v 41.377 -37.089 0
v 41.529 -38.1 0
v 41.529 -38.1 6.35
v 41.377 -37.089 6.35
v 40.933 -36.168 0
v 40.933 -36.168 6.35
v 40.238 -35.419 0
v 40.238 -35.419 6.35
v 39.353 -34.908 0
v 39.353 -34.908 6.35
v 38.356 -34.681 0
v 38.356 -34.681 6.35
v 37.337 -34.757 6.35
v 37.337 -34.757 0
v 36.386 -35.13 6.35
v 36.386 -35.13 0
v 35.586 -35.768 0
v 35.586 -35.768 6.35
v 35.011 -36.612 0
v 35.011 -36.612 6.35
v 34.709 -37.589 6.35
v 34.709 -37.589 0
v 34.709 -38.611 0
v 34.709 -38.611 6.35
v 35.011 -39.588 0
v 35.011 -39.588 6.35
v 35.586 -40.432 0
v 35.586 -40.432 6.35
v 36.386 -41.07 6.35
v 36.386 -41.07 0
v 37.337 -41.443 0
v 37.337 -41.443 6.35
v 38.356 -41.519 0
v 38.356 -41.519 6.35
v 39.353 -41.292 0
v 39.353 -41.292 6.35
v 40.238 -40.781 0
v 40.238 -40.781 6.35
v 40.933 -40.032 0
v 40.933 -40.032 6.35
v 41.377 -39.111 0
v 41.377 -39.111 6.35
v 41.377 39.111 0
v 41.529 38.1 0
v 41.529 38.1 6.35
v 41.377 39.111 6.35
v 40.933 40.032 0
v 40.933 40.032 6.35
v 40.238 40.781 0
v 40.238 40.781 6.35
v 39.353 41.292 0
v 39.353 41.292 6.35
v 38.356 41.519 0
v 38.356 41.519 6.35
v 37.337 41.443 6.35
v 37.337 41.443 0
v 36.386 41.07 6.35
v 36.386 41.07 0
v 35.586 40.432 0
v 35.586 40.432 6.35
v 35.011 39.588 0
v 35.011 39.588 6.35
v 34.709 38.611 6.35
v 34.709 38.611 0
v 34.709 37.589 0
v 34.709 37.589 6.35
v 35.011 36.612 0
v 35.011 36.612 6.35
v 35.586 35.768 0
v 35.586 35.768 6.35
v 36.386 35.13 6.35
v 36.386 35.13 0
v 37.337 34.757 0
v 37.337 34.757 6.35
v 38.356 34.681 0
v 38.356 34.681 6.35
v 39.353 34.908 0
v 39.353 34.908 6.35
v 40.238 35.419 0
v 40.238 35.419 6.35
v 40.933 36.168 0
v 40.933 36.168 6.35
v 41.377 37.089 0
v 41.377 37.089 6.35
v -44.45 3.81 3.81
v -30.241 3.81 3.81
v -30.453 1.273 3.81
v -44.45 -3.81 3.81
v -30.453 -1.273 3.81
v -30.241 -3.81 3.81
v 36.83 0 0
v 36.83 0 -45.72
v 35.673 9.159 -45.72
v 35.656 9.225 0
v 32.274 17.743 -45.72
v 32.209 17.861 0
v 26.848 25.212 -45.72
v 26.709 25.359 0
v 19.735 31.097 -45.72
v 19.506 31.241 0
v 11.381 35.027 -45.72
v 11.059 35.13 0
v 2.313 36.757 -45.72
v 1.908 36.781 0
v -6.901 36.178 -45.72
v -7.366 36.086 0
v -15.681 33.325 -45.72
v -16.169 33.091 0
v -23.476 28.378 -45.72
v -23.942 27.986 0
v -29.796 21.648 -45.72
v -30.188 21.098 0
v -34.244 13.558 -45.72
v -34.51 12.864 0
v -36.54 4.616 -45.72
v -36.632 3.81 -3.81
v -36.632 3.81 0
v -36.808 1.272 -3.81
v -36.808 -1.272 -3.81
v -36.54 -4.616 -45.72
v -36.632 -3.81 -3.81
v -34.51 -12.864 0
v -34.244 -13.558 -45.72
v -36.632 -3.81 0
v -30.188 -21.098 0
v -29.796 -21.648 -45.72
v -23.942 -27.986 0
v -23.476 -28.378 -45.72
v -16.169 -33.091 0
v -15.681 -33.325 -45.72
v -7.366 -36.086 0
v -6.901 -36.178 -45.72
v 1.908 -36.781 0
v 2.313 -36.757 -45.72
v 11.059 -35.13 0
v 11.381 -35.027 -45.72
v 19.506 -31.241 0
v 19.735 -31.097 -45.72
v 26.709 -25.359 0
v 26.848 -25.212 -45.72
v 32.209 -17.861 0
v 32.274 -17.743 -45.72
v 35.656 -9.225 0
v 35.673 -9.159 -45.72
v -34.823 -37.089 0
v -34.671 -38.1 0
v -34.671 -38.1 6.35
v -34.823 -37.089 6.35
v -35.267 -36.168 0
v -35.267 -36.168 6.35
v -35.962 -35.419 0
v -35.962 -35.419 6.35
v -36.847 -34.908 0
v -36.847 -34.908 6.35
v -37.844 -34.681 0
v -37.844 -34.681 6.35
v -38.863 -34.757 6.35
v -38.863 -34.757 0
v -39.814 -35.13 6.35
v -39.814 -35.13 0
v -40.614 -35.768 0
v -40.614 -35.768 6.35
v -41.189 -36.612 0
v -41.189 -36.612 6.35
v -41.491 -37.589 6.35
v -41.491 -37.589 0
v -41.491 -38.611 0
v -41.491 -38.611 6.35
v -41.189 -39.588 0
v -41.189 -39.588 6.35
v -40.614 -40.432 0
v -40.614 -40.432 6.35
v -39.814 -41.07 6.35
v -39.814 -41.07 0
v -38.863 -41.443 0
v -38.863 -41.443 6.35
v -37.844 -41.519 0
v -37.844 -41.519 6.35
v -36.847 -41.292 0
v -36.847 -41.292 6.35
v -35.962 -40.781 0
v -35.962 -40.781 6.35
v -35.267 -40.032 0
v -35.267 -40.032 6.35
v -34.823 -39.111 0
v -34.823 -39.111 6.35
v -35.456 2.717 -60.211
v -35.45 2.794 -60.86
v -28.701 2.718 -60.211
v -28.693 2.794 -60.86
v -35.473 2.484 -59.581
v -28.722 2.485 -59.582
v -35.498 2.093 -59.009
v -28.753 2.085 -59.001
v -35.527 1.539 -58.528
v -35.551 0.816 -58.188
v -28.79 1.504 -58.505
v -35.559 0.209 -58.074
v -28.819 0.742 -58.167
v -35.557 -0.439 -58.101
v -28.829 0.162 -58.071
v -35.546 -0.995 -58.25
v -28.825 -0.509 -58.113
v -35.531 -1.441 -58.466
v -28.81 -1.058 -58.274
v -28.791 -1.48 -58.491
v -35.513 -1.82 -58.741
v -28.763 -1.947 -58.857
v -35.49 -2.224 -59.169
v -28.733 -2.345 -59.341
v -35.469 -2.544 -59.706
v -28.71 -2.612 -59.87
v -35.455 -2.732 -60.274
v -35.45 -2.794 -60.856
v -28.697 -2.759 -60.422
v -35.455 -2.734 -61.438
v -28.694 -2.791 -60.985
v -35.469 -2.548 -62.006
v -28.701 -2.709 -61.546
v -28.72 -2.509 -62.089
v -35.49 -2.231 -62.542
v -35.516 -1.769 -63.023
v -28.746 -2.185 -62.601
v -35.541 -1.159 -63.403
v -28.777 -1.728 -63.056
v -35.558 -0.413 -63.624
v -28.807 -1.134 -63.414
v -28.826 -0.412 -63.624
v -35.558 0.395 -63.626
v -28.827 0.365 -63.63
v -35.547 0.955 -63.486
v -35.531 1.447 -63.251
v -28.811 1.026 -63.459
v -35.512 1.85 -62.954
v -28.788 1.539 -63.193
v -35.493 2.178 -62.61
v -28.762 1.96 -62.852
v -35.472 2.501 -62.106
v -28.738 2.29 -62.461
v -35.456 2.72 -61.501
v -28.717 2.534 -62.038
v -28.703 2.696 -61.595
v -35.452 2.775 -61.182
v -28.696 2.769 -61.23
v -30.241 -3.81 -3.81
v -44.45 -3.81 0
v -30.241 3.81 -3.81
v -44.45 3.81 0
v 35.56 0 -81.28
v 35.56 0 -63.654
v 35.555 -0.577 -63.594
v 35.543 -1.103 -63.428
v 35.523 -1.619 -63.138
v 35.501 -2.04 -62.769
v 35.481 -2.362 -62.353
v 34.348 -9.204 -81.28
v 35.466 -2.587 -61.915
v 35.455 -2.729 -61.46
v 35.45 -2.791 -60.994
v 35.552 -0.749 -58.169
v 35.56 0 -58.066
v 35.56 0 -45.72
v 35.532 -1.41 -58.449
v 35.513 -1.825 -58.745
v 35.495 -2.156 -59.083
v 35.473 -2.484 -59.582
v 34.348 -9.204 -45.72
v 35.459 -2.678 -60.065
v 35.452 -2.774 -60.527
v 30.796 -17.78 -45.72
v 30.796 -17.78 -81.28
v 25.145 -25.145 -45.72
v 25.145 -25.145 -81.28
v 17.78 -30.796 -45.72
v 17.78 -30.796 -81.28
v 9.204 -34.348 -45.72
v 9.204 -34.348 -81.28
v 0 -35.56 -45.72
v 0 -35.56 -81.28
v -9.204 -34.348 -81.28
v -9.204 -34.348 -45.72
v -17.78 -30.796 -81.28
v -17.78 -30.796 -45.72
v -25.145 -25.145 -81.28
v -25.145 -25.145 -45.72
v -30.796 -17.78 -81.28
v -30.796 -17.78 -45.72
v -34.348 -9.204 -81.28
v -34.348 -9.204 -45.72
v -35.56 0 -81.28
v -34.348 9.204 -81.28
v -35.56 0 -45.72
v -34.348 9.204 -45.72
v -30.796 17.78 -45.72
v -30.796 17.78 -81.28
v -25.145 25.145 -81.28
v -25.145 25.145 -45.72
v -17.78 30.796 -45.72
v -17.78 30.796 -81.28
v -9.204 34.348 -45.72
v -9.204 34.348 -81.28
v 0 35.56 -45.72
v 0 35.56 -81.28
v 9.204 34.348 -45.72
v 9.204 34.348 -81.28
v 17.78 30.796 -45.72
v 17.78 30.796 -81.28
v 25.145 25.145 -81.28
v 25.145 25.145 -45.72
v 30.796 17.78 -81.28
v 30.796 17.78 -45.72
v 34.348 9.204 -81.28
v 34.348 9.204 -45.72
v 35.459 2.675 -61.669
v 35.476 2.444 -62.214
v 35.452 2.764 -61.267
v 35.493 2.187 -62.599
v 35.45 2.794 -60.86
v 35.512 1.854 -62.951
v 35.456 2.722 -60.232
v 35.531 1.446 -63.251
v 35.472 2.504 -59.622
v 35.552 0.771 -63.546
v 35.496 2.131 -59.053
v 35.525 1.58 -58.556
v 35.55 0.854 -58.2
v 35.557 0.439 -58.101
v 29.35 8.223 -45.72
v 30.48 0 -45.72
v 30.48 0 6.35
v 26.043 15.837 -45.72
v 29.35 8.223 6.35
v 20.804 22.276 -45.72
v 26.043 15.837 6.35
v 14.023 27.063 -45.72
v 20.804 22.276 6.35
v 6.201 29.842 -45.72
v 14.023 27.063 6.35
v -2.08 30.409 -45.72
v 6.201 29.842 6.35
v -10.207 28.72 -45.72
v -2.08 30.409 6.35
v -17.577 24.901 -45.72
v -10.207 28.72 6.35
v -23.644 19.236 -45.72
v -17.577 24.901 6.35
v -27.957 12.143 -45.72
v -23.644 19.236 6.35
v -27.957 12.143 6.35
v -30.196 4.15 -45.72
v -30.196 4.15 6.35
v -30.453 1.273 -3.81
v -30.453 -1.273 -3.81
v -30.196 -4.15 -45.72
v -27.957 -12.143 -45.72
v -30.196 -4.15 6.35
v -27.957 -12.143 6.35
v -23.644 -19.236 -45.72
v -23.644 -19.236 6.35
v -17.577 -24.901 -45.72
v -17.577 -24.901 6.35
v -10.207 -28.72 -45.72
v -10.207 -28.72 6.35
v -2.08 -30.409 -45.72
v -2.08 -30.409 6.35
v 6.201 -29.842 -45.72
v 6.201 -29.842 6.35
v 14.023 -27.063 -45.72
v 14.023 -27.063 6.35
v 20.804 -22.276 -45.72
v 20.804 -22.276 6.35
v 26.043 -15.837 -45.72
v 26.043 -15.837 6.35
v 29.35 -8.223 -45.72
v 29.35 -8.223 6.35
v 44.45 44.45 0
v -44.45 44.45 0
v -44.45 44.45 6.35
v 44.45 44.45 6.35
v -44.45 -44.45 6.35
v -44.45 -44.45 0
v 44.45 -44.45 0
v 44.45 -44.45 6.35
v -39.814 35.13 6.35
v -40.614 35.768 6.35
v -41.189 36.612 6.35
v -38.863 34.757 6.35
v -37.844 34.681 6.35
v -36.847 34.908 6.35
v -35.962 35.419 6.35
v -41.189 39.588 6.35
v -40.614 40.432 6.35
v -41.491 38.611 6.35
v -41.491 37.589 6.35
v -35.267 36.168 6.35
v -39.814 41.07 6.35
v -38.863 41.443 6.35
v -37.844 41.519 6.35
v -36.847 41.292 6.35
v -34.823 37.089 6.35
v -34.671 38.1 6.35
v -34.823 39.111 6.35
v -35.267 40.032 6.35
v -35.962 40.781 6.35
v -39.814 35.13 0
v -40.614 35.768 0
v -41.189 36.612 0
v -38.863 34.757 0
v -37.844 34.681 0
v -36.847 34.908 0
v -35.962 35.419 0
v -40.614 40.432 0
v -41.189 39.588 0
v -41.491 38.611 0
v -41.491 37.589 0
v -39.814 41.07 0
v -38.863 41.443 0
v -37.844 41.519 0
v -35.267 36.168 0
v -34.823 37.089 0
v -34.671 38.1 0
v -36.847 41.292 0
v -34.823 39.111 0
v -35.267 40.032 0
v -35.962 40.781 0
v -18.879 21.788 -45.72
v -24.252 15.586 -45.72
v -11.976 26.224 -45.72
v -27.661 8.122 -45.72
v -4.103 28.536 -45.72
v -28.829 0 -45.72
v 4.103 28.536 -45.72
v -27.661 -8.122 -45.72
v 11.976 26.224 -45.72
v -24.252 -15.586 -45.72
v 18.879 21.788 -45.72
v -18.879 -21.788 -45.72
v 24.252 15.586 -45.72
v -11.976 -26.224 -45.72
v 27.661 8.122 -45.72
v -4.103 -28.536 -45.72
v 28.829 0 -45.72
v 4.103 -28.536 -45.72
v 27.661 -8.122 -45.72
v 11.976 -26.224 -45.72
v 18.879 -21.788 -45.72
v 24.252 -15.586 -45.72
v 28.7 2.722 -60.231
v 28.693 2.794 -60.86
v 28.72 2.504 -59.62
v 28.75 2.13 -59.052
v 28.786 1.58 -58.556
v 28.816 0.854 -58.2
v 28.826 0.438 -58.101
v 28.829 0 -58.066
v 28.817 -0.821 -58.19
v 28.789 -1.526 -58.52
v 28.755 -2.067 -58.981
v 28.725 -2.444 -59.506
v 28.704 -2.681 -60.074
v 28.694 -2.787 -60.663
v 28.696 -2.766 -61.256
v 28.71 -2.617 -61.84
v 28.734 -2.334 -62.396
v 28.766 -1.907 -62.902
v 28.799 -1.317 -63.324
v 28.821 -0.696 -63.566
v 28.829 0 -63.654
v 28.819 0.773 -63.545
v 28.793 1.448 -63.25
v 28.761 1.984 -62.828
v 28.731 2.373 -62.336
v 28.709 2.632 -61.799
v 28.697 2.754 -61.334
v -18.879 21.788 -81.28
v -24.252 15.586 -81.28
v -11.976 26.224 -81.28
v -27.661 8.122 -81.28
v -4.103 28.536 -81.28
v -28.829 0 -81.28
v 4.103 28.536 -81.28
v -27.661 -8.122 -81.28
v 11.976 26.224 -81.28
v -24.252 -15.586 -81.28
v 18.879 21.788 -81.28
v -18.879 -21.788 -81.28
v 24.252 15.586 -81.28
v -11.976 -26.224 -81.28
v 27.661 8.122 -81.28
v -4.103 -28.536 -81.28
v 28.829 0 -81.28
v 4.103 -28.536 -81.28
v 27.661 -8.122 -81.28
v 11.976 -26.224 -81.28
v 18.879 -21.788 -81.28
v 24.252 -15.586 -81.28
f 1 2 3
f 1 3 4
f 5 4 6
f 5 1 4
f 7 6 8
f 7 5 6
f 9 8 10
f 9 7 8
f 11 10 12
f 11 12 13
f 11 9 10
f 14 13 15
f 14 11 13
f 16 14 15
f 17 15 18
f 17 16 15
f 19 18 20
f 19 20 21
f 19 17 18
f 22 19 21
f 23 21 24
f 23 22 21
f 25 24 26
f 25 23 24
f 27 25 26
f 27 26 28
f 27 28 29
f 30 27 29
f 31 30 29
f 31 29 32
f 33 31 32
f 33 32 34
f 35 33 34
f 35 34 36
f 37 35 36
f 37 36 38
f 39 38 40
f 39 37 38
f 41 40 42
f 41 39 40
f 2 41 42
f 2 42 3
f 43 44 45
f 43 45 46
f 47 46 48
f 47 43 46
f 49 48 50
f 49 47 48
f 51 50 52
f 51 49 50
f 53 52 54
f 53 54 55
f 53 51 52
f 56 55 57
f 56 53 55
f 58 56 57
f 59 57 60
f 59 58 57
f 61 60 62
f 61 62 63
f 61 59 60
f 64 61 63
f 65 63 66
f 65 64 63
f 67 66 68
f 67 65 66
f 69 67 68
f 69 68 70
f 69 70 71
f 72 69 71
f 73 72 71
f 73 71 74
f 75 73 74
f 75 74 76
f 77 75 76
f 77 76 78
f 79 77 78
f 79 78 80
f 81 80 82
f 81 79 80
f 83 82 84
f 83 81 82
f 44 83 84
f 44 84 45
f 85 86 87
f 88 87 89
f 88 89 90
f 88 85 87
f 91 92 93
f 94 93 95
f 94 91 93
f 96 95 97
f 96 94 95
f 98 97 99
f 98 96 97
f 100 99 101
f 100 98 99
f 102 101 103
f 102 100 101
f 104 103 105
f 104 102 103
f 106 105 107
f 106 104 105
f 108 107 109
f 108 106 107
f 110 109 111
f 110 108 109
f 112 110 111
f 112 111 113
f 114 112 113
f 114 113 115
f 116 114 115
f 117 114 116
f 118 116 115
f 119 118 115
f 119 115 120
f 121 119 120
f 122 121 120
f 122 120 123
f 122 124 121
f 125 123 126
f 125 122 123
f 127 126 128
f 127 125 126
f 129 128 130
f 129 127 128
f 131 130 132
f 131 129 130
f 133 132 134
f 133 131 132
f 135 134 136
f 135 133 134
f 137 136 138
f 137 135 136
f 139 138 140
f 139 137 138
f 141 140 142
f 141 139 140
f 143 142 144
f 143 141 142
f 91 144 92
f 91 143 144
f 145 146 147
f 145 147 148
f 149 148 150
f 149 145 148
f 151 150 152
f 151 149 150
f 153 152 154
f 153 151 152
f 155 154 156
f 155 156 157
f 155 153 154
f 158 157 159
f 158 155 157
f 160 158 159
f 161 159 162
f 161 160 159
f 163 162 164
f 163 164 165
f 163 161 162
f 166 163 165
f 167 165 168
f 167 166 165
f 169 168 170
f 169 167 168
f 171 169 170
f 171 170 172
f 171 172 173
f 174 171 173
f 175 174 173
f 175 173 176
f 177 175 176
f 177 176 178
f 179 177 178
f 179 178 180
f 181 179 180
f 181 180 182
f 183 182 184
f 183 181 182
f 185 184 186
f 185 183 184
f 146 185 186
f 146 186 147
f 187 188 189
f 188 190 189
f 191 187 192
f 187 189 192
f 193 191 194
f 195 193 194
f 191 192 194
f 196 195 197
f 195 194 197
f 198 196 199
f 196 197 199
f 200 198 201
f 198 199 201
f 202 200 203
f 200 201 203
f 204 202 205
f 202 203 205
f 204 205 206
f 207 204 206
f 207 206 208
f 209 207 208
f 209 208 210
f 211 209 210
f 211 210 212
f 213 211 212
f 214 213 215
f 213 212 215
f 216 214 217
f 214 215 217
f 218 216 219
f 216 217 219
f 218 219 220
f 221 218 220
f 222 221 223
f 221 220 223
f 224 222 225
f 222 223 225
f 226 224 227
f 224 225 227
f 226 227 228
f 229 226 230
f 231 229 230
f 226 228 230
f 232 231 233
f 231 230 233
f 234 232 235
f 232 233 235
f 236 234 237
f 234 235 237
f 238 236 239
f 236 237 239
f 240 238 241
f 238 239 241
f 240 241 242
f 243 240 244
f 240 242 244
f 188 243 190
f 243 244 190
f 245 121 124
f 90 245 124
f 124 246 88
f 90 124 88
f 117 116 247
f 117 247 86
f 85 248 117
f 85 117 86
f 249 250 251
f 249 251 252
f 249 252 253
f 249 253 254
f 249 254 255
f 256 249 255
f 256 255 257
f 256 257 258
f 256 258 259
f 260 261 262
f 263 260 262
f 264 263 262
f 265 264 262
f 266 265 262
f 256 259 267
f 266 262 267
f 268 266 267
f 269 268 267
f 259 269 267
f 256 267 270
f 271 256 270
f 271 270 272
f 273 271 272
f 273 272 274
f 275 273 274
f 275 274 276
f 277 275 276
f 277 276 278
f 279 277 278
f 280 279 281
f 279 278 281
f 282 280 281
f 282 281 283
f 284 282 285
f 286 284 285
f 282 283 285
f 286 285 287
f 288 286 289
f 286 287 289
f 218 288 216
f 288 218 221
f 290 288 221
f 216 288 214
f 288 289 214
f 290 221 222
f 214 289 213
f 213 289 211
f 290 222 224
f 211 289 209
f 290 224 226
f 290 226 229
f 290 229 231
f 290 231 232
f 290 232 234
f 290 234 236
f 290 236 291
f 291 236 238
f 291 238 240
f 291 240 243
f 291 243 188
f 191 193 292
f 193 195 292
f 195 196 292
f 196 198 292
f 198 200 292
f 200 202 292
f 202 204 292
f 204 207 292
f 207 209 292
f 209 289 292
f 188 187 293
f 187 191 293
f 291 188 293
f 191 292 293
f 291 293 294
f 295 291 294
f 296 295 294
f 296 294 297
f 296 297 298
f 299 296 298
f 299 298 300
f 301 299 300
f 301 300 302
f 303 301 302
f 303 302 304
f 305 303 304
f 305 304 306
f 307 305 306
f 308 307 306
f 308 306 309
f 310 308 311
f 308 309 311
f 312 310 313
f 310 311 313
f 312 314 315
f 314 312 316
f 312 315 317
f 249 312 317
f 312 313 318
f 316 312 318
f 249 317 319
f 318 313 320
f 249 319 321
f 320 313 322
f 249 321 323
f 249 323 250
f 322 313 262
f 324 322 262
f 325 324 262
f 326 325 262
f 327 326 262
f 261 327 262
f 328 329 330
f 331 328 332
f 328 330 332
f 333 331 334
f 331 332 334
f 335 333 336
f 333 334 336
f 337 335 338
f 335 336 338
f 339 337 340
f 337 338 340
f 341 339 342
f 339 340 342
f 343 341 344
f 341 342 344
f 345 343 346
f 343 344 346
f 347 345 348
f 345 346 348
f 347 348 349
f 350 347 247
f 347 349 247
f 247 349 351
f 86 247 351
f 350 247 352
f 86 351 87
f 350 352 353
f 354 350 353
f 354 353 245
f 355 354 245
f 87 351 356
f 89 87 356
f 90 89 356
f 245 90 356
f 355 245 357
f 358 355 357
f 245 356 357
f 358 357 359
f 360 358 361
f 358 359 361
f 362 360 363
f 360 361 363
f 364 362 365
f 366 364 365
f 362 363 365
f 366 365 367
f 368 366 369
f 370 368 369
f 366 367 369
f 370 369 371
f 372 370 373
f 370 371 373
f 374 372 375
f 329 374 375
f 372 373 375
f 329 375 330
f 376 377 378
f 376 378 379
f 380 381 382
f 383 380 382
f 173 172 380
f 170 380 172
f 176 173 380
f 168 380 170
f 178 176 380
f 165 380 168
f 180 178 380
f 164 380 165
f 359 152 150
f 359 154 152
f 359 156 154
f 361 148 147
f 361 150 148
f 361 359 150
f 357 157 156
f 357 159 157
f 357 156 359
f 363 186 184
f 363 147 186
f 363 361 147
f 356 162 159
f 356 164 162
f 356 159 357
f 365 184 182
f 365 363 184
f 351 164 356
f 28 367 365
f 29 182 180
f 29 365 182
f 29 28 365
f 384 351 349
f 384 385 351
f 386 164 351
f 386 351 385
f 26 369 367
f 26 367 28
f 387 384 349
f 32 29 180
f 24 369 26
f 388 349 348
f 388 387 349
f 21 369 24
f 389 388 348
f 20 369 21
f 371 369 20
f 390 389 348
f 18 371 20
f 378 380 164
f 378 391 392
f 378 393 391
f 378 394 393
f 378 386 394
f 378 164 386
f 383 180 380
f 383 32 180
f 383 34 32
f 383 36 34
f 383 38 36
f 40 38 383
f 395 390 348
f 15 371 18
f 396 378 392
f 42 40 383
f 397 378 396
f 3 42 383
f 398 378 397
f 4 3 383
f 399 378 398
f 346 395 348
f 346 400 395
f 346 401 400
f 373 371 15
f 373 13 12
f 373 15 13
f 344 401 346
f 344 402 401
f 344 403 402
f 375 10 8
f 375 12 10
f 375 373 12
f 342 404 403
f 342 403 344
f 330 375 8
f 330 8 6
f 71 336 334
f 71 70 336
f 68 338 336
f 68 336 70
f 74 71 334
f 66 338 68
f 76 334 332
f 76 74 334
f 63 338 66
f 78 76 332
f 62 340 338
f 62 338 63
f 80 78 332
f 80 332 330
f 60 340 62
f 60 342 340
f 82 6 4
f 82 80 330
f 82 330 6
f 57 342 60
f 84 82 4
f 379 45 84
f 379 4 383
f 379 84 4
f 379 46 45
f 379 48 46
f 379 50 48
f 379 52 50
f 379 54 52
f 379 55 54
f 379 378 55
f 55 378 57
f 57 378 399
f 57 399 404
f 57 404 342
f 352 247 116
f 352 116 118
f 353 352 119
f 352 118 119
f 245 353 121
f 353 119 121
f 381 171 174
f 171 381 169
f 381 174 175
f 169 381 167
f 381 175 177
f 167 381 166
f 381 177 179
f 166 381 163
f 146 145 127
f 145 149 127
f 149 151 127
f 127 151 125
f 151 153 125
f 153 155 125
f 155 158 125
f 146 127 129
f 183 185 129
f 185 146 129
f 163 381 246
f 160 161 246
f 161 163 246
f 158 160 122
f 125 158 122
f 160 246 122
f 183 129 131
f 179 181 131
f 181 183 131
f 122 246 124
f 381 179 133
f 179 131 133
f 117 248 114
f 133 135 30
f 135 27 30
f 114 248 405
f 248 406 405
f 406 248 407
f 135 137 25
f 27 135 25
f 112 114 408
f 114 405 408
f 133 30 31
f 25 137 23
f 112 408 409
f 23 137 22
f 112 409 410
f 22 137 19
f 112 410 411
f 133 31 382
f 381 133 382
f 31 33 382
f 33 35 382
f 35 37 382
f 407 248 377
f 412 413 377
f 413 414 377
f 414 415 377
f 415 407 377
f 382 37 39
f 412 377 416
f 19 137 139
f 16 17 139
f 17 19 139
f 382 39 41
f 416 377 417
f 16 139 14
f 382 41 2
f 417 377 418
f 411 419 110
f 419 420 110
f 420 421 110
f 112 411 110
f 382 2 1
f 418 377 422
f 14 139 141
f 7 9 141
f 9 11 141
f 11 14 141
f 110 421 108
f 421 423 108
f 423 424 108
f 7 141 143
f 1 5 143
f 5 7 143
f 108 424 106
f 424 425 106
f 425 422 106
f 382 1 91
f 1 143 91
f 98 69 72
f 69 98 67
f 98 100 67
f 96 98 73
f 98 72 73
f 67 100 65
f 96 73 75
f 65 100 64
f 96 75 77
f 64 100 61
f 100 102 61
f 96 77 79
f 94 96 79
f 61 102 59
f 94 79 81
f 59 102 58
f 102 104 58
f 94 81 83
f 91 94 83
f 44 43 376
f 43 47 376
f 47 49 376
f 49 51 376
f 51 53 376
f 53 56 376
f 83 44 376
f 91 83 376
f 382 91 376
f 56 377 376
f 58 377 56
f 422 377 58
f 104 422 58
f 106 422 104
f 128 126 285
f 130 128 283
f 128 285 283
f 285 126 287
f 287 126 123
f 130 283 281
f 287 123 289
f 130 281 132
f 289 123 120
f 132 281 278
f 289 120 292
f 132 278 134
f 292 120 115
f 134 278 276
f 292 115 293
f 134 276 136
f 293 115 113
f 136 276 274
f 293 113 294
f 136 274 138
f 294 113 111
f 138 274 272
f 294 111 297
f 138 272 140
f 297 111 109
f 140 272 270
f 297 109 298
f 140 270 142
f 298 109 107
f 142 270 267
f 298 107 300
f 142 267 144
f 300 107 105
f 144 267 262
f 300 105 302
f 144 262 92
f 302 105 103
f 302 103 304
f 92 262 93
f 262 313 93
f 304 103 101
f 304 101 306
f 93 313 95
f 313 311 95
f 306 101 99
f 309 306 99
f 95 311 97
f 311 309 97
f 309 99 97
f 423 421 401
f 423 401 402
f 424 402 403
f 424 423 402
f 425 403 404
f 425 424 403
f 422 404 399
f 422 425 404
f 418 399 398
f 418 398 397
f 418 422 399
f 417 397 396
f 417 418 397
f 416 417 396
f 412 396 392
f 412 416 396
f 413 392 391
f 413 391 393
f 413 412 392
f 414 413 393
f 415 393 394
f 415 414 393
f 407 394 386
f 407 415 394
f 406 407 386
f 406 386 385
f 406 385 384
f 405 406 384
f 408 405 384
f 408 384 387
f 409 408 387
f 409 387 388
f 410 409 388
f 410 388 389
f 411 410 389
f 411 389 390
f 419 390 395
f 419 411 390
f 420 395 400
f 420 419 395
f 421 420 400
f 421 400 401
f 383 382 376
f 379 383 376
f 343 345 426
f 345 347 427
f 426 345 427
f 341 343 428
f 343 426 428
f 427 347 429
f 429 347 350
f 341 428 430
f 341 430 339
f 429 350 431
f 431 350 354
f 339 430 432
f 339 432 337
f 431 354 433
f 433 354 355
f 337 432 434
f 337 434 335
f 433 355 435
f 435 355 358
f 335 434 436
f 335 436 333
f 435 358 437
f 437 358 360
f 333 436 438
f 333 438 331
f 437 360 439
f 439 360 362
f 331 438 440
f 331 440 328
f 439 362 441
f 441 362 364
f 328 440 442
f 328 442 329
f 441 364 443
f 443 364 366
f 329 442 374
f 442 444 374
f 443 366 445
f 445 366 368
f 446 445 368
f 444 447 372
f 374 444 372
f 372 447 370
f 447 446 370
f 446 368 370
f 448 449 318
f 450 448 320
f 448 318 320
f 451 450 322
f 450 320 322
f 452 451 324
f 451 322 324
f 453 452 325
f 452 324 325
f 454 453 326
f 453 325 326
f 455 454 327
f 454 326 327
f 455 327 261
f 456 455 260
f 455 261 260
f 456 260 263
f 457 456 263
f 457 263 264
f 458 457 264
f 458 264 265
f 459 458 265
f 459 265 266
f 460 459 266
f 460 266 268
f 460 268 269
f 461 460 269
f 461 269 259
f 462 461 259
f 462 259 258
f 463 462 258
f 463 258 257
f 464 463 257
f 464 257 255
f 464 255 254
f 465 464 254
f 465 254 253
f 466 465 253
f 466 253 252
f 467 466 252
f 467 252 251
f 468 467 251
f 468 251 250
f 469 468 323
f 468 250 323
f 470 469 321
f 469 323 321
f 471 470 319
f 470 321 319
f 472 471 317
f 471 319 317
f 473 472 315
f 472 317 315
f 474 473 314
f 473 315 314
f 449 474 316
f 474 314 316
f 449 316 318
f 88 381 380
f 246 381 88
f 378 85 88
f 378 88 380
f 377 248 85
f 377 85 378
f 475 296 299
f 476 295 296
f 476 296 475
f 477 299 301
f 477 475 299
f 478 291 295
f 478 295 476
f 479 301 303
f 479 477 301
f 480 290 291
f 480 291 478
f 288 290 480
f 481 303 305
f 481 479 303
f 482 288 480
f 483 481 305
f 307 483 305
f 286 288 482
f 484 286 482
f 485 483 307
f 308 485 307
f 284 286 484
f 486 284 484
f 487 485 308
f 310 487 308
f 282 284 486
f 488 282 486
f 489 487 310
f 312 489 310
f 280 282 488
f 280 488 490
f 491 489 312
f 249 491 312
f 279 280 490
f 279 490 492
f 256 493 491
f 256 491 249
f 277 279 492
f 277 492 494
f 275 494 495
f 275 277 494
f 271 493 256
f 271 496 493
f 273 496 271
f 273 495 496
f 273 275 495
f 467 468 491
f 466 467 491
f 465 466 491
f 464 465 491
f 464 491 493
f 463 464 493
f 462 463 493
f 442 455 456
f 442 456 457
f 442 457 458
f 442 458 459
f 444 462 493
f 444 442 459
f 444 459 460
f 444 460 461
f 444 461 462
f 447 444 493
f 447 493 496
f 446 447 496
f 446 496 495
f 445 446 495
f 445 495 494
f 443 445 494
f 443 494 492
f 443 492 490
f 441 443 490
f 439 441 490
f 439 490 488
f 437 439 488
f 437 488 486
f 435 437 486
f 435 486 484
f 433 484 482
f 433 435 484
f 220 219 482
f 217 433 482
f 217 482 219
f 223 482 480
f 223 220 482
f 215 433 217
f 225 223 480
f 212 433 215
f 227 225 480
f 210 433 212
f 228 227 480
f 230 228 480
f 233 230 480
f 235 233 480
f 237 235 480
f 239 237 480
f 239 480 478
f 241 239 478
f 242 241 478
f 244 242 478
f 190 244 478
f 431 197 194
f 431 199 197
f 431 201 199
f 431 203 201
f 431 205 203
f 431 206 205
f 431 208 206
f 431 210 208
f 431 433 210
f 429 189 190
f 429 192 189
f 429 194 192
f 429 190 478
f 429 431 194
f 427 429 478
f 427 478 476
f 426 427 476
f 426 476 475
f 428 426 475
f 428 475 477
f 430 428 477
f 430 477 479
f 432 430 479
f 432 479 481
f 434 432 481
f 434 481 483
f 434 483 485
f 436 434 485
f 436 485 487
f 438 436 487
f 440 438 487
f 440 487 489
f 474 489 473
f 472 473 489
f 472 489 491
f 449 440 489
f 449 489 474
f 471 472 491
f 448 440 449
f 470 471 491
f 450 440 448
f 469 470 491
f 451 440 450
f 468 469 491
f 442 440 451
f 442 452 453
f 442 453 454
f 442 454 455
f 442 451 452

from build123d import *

# Parameters (mm, degrees)
F0_W      = 88.9
F0_H      = 88.9
F0_R      = 3.429
F1_DEPTH  = 6.35
F2_R      = 30.48
F3_DEPTH  = 6.351
F4_R      = 36.83
F4_R_2    = 30.48
F5_DEPTH  = 45.72
F6_R      = 35.56
F6_R_2    = 28.829
F7_DEPTH  = 35.56
F9_W      = 7.62
F9_H      = 7.62
F10_DEPTH = 25.49487
F11_R     = 2.794
F12_DEPTH = 44.45


with BuildPart() as f1:
    # F0 (on Top) → F1 (new body)
    with BuildSketch(Plane.XY):
        Rectangle(F0_W, F0_H)
        with Locations((-38.1, -38.1)):
            Circle(F0_R, mode=Mode.SUBTRACT)
        with Locations((38.1, -38.1)):
            Circle(F0_R, mode=Mode.SUBTRACT)
        with Locations((-38.1, 38.1)):
            Circle(F0_R, mode=Mode.SUBTRACT)
        with Locations((38.1, 38.1)):
            Circle(F0_R, mode=Mode.SUBTRACT)
    extrude(amount=F1_DEPTH)

    # F2 (on face) → F3 (cut, through all)
    with BuildSketch(Plane(origin=(0, 0, 0), x_dir=(1, 0, 0), z_dir=(0, 0, -1))):
        Circle(F2_R)
    extrude(amount=-F3_DEPTH, mode=Mode.SUBTRACT)

    # F4 (on Top) → F5 (join)
    with BuildSketch(Plane.XY):
        Circle(F4_R)
        Circle(F4_R_2, mode=Mode.SUBTRACT)
    extrude(amount=-F5_DEPTH)

    # F6 (on face) → F7 (join)
    with BuildSketch(Plane(origin=(0, 0, -45.72), x_dir=(1, 0, 0), z_dir=(0, 0, -1))):
        Circle(F6_R)
        Circle(F6_R_2, mode=Mode.SUBTRACT)
    extrude(amount=F7_DEPTH)

    # F9 (on face) → F10 (cut)
    with BuildSketch(Plane(origin=(-44.45, 0, 0), x_dir=(0, -1, 0), z_dir=(-1, 0, 0))):
        Rectangle(F9_W, F9_H)
    extrude(amount=-F10_DEPTH, mode=Mode.SUBTRACT)

    # F11 (on Right) → F12 (cut, symmetric)
    with BuildSketch(Plane.YZ):
        with Locations((0, -60.8604100329)):
            Circle(F11_R)
    extrude(amount=F12_DEPTH, both=True, mode=Mode.SUBTRACT)


solid = f1.part
